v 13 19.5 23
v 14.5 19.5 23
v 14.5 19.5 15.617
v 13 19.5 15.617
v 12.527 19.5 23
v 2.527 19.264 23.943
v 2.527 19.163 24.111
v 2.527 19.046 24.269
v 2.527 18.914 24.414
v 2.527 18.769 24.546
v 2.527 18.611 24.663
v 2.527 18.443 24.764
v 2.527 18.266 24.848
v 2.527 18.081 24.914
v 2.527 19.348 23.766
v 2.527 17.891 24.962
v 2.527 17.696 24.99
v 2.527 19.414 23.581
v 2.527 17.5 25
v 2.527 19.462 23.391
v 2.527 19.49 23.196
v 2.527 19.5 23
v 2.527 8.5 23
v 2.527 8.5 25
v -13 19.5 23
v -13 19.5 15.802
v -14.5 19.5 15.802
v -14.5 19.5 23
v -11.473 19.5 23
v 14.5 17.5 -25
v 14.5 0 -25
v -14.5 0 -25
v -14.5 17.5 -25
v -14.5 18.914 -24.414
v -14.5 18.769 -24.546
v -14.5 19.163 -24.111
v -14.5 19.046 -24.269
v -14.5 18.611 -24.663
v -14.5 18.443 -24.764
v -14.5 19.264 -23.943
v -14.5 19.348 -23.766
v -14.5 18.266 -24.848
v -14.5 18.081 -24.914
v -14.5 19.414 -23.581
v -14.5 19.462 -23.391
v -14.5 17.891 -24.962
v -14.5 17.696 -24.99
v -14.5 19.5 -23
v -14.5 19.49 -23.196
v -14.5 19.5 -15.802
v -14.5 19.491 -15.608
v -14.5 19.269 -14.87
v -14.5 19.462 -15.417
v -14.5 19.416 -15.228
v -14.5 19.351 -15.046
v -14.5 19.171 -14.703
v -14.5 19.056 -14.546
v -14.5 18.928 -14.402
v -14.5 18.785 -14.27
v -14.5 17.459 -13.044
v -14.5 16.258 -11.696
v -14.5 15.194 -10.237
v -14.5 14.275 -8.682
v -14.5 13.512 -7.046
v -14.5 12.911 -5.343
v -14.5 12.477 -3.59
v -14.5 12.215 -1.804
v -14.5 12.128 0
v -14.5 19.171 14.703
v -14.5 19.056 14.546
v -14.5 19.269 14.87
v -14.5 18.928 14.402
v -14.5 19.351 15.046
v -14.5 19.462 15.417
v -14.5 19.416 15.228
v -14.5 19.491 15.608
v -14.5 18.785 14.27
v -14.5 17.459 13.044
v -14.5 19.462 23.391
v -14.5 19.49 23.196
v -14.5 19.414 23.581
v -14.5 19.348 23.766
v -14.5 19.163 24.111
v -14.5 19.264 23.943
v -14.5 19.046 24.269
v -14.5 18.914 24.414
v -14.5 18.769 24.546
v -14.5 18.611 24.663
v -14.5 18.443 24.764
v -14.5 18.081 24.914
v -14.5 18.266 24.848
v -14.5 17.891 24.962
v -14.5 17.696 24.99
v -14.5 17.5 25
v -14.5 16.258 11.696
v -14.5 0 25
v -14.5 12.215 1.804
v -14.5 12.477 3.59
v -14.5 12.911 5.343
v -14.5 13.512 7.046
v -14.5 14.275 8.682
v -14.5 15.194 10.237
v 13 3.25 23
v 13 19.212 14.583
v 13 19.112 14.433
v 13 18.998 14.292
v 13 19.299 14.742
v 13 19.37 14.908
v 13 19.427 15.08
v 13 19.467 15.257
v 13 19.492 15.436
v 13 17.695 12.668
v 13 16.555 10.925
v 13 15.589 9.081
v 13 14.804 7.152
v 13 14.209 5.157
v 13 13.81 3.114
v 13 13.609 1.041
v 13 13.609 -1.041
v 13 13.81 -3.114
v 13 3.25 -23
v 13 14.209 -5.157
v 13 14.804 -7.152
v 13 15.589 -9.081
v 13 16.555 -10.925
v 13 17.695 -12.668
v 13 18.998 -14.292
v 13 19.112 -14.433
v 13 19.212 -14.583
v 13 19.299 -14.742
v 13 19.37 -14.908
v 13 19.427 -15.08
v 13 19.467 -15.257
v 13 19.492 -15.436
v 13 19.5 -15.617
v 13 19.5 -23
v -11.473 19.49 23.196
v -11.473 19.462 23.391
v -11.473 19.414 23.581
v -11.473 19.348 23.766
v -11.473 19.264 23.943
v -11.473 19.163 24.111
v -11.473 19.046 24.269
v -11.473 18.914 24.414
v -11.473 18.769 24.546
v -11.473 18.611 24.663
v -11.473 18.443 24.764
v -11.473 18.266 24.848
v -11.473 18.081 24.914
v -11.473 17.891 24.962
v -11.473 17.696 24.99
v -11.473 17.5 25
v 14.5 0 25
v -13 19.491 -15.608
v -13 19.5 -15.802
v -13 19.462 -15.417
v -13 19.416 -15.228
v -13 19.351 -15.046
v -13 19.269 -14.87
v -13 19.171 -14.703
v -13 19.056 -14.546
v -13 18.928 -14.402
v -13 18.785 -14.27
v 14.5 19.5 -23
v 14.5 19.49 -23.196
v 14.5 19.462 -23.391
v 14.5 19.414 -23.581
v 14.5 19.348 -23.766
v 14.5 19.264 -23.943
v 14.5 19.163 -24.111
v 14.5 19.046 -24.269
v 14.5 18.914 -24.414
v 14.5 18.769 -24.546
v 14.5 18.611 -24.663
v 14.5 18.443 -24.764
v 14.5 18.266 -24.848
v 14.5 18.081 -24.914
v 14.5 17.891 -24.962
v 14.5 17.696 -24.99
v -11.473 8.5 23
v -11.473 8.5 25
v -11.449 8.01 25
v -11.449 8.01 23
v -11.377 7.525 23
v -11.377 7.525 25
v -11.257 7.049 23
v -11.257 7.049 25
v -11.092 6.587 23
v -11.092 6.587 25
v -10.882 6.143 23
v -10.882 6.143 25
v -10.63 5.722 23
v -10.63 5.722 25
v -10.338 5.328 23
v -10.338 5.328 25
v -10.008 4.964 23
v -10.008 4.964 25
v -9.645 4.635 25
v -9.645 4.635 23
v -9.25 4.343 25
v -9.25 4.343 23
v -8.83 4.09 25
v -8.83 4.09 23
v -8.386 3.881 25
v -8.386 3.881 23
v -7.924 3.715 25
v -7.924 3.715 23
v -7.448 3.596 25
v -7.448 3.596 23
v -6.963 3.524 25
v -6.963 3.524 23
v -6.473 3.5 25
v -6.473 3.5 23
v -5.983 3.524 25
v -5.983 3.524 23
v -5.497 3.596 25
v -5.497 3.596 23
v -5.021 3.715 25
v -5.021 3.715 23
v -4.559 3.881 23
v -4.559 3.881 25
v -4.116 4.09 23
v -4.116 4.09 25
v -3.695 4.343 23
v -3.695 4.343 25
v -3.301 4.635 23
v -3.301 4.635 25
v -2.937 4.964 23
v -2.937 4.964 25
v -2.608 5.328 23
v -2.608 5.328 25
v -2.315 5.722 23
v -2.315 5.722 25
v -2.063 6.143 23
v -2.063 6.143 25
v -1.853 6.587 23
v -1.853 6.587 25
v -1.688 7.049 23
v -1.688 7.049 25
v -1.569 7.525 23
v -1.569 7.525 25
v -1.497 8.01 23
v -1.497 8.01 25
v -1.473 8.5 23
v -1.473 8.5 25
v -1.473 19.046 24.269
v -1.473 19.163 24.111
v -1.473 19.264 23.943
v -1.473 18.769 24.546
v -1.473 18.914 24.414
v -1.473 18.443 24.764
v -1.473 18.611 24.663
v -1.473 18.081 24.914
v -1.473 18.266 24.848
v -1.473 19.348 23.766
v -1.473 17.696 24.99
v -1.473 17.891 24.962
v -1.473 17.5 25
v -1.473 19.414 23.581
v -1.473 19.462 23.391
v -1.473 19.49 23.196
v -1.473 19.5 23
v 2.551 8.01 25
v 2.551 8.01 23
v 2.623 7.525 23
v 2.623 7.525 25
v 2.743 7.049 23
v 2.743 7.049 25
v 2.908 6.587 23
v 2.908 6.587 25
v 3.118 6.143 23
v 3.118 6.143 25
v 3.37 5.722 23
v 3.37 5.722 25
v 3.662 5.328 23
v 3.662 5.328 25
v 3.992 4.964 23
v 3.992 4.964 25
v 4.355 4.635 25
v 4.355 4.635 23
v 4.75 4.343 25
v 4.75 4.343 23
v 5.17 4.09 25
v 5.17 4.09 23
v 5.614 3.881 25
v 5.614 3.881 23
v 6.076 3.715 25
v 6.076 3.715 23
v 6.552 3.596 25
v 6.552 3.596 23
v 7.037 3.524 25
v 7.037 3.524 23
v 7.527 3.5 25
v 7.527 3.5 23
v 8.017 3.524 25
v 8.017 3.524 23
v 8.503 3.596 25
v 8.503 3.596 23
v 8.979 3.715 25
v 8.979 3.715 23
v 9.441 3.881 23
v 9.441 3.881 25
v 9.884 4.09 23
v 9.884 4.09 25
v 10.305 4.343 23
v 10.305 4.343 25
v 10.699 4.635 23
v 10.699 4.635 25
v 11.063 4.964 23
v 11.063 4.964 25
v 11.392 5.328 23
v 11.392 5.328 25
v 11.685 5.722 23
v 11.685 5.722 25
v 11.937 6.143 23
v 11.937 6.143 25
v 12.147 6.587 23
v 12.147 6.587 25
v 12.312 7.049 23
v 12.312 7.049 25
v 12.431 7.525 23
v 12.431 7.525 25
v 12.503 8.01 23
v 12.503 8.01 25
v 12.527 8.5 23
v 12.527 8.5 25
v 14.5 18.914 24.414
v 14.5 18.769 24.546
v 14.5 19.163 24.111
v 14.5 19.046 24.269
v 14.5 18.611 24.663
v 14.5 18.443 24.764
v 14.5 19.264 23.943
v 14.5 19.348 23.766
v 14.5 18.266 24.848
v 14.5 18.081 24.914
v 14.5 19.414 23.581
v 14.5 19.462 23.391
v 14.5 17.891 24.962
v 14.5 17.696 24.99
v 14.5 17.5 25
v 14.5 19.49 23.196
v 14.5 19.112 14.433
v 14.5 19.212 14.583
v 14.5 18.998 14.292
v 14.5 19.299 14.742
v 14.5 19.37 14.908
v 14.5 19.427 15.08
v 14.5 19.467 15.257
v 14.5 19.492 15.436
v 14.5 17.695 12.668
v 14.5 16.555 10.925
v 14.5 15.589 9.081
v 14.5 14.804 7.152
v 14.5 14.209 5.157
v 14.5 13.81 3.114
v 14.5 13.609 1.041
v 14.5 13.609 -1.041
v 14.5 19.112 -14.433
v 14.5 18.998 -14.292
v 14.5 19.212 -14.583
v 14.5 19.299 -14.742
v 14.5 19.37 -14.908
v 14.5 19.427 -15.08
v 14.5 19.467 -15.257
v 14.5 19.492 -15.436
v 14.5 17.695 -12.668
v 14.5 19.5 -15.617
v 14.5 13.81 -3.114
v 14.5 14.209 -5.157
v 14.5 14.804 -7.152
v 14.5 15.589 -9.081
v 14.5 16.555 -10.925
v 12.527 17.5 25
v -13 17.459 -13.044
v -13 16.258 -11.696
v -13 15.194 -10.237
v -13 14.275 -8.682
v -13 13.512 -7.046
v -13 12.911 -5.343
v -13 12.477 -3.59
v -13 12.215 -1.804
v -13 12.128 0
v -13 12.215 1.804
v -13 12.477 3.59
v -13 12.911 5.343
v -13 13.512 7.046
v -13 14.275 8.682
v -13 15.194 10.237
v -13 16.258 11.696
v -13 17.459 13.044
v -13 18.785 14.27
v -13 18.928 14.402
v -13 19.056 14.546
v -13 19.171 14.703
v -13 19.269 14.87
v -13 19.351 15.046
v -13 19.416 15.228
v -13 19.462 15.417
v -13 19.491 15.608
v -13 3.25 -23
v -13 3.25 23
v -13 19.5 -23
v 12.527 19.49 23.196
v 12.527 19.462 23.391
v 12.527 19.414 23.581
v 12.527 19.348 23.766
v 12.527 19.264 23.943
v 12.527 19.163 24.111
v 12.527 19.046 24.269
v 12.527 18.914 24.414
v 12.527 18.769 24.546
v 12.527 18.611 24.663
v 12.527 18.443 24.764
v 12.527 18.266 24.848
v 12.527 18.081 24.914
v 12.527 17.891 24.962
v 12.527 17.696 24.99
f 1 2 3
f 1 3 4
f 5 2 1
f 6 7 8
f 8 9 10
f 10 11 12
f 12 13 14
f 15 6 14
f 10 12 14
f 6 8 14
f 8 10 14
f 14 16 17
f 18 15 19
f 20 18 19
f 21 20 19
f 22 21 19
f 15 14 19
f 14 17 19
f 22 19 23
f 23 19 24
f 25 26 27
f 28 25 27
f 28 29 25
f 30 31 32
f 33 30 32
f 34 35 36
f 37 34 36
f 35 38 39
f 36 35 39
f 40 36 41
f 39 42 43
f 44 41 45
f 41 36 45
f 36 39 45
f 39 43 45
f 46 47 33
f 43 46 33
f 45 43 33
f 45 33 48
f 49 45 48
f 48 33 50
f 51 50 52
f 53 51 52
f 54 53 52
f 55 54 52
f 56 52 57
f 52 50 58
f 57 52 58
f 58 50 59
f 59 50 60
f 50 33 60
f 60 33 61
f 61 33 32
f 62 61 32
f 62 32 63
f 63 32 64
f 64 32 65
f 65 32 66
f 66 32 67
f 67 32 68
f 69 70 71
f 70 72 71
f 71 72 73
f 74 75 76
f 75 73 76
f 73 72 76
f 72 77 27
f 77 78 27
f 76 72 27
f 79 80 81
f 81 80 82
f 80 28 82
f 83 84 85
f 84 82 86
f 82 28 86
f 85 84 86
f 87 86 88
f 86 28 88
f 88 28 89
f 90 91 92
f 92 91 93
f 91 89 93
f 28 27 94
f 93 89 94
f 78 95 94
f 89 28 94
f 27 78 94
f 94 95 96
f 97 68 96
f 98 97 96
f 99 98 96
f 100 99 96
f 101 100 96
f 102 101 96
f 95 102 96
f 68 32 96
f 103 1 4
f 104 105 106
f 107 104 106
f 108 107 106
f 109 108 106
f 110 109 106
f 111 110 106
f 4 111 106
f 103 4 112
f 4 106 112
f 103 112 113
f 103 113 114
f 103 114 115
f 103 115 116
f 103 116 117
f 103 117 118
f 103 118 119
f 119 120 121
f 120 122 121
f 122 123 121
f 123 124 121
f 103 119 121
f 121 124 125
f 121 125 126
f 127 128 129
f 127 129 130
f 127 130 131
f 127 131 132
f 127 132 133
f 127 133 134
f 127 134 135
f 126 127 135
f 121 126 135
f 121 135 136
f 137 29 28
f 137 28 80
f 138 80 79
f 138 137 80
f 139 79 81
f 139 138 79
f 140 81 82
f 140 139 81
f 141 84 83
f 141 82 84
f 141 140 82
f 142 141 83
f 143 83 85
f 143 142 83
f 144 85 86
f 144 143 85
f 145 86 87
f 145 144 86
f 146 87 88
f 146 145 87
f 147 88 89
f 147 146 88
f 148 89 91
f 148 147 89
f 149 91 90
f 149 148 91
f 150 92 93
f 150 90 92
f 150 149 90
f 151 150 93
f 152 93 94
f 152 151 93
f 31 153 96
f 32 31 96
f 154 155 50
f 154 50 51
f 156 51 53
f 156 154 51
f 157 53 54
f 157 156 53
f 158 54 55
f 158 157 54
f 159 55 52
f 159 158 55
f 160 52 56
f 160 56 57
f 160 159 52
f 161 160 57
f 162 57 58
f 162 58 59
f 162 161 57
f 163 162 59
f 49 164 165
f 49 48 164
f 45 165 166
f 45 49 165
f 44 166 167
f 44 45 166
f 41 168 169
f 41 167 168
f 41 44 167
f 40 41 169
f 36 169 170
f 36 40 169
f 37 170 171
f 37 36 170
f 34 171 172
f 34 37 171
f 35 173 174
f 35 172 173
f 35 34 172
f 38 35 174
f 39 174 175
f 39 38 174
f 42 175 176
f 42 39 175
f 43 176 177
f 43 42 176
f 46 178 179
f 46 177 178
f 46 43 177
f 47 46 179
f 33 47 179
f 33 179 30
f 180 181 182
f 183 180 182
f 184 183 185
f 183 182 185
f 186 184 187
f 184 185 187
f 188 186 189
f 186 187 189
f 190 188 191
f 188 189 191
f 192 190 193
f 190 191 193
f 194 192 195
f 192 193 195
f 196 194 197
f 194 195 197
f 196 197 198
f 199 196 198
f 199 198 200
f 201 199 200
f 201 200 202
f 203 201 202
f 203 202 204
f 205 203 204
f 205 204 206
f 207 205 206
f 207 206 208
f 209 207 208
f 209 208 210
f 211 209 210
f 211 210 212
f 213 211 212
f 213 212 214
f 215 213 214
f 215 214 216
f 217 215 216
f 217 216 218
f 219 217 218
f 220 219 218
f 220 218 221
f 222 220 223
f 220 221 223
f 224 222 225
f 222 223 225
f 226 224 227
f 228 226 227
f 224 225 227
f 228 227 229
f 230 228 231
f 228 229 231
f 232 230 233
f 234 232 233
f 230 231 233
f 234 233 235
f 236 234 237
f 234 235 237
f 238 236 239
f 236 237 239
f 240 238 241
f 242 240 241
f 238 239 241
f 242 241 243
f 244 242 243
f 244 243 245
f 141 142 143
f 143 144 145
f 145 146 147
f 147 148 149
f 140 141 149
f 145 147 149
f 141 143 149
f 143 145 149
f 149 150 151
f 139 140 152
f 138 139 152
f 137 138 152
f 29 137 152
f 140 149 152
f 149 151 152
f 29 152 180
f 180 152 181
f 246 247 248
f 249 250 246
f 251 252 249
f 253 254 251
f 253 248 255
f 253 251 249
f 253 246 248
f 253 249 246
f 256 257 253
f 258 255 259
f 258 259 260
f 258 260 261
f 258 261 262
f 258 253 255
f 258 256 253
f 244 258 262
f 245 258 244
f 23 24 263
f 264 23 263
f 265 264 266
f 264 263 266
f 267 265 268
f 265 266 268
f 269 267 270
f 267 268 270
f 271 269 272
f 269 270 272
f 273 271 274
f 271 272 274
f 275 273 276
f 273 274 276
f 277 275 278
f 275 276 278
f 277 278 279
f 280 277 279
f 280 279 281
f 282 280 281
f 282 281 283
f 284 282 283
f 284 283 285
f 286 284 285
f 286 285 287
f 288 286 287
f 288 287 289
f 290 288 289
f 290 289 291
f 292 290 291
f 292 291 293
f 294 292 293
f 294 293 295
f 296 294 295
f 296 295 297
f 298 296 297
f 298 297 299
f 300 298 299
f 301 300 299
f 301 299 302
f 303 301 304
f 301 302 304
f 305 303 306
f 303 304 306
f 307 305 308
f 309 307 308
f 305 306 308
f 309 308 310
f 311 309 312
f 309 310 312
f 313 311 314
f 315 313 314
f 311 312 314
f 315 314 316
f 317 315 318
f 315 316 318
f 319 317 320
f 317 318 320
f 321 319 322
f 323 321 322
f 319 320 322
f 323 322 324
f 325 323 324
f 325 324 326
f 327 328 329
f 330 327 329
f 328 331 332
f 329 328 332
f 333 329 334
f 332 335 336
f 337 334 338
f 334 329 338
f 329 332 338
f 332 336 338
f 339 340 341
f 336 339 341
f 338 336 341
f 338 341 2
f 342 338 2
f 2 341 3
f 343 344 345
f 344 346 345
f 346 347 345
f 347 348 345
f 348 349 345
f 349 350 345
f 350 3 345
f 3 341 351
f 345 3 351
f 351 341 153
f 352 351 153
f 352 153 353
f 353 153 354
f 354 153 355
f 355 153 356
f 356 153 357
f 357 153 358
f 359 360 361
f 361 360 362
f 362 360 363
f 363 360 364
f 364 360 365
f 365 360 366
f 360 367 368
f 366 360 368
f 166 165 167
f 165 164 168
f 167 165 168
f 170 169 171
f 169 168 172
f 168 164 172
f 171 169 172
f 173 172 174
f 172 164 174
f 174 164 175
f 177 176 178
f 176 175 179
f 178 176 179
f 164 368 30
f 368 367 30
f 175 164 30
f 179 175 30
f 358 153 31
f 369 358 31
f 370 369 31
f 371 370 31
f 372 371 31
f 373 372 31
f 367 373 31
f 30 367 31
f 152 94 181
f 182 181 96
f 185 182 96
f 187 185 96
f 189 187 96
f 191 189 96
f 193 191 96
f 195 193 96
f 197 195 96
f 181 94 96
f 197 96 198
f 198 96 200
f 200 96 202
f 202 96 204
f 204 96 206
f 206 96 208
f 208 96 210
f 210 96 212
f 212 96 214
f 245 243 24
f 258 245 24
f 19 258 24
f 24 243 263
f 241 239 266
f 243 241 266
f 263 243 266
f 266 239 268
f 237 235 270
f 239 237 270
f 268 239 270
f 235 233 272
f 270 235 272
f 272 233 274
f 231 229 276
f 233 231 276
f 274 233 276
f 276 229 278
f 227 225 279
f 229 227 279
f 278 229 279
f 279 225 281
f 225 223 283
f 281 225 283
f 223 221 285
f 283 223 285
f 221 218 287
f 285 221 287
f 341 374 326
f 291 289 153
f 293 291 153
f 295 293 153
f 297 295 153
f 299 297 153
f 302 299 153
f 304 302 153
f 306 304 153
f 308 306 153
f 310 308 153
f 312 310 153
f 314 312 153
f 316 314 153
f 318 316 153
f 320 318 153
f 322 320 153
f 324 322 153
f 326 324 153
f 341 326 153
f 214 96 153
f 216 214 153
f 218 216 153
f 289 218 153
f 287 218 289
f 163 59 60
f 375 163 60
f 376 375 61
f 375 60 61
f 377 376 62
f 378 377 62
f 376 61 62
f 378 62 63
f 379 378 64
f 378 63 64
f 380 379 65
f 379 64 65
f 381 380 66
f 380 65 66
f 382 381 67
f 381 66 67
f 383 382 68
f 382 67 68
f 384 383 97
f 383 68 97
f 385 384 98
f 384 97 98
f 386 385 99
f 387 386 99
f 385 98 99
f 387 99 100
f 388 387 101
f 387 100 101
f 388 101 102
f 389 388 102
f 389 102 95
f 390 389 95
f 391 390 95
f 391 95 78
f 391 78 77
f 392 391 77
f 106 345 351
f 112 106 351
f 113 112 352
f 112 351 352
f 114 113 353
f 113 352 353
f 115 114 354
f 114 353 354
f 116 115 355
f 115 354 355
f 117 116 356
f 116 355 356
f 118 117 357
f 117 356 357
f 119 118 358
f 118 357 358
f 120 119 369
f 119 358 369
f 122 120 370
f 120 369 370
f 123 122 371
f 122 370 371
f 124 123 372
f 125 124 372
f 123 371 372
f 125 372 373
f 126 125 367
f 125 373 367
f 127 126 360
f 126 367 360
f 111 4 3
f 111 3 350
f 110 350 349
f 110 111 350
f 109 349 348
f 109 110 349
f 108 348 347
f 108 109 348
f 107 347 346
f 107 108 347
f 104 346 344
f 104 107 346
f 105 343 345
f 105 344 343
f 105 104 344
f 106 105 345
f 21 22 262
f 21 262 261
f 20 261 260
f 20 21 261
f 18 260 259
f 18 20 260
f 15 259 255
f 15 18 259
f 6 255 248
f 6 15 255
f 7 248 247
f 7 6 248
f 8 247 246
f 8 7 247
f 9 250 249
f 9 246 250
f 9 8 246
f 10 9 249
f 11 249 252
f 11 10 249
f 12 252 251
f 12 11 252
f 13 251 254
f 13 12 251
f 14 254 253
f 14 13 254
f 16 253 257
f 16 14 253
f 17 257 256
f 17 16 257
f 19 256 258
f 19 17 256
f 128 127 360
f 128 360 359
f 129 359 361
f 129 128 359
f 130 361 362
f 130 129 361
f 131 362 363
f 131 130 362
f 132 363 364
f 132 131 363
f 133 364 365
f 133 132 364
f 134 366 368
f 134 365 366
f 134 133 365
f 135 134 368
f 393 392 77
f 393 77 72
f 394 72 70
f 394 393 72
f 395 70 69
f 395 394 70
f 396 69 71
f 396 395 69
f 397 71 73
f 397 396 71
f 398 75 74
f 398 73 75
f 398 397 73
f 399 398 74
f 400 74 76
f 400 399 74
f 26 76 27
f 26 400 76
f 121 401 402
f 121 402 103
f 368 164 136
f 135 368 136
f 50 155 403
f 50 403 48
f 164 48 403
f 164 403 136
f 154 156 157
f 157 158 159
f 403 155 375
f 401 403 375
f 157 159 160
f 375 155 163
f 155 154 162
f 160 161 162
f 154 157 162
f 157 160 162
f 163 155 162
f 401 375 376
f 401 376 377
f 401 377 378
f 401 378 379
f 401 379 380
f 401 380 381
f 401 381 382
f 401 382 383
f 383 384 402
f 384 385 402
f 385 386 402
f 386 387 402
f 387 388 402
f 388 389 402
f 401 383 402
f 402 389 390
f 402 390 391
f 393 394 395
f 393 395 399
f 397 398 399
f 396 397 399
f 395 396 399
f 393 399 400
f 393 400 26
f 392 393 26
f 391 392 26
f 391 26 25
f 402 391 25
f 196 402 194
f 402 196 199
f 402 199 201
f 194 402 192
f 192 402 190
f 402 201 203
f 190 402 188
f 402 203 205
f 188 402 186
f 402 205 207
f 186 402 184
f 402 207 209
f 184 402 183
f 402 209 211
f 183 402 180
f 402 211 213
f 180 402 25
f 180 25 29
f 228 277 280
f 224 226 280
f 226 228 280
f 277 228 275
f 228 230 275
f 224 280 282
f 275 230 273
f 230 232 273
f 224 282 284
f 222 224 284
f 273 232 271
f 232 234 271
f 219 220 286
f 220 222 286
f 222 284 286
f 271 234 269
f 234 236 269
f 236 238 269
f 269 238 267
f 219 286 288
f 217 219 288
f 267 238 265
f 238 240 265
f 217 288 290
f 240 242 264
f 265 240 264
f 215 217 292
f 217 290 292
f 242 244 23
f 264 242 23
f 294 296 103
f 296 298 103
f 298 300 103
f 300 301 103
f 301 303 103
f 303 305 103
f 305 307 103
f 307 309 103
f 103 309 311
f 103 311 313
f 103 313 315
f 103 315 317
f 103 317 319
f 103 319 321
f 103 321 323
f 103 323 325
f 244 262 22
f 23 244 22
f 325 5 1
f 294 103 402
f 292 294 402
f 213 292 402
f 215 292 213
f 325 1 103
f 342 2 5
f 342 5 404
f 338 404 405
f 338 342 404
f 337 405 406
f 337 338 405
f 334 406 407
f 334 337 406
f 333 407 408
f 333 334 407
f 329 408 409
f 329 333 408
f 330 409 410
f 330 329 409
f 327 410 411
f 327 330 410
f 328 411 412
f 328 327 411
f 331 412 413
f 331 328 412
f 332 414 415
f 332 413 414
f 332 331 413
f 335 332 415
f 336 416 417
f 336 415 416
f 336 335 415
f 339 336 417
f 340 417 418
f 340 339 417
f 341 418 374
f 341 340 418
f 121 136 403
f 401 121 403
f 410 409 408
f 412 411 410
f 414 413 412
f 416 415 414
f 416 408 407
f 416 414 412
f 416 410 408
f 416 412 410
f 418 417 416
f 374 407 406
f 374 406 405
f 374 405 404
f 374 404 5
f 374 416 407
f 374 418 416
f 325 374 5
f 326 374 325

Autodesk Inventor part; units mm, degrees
ref_plane "YZ Plane" through (0, 0, 0) normal (1, 0, 0) x (0, 1, 0)
ref_plane "XZ Plane" through (0, 0, 0) normal (0, 1, 0) x (-1, 0, 0)
ref_plane "XY Plane" through (0, 0, 0) normal (0, 0, 1) x (1, 0, 0)
sketch "Boceto1" plane through (0, 0, 0) normal (0, 1, 0) x (-1, 0, 0)
  line L0 (-13, -23) -> (13, -23)
  line L1 (13, -23) -> (13, 23)
  line L2 (13, 23) -> (-13, 23)
  line L3 (-13, 23) -> (-13, -23)
  line L4 (-13, -23) -> (13, 23) construction
  line L5 (13, -23) -> (-13, 23) construction
  line L6 (-14.5, -25) -> (14.5, -25)
  line L7 (14.5, -25) -> (14.5, 25)
  line L8 (14.5, 25) -> (-14.5, 25)
  line L9 (-14.5, 25) -> (-14.5, -25)
  line L10 (-14.5, -25) -> (14.5, 25) construction
  line L11 (14.5, -25) -> (-14.5, 25) construction
  point P0 (0, 0)
  dimension "d0" = 46
  dimension "d1" = 26
  dimension "d2" = 2
  dimension "d3" = 1.5
extrude "Extrusión1" add sketch "Boceto1" along normal blind 19.5 contours L3 L2 L1 L0 | L9 L8 L7 L6
sketch "Boceto2" plane through (0, 19.5, 0) normal (0, 1, 0) x (1, 0, 0)
  line L0 (-13, -23) -> (13, -23) projected
  line L1 (13, -23) -> (13, 23) projected
  line L2 (13, 23) -> (-13, 23) projected
  line L3 (-13, 23) -> (-13, -23) projected
  point P0 (0, 0)
extrude "Extrusión2" cut sketch "Boceto2" against normal blind 16.25
sketch "Boceto3" plane through (-14.5, 0, 25) normal (0, 0, 1) x (1, 0, 0)
  line L0 (29, 19.5) -> (0, 19.5) projected
  line L1 (13.0274, 19.5) -> (13.0274, 8.5)
  line L2 (17.0274, 19.5) -> (17.0274, 8.5)
  line L3 (3.0274, 19.5) -> (3.0274, 8.5)
  line L4 (27.0274, 19.5) -> (27.0274, 8.5)
  arc A0 (3.0274, 8.5) -> (13.0274, 8.5) centre (8.0274, 8.5) ccw
  arc A1 (17.0274, 8.5) -> (27.0274, 8.5) centre (22.0274, 8.5) ccw
  point P0 (14.5, 0)
  dimension "d8" = 11
  dimension "d10" = 10
  dimension "d11" = 10
  dimension "d12" = 4
  dimension "d13" = 11
  dimension "d14" = 11
  dimension "d15" = 11
extrude "Extrusión3" cut sketch "Boceto3" against normal blind 17
sketch "Boceto4" plane through (-14.5, 0, -25) normal (-1, 0, 0) x (0, 0, 1)
  line L0 (48, 19.5) -> (2, 19.5) projected
  arc A0 (10.16, 19.5) -> (39.84, 19.5) centre (25, 30.7495) ccw
  line L1 (0, 0) -> (0, 19.5) projected
  line L2 (50, 0) -> (50, 19.5) projected
  point P0 (25, 0)
  dimension "d18" = 10.16
  dimension "d19" = 10.16
extrude "Extrusión4" cut sketch "Boceto4" against normal blind 17
sketch "Boceto5" plane through (14.5, 0, 25) normal (1, 0, 0) x (0, 0, -1)
  line L0 (48, 19.5) -> (2, 19.5) projected
  arc A0 (10.16, 19.5) -> (39.84, 19.5) centre (25, 35.1546) ccw
  line L1 (50, 0) -> (50, 19.5) projected
  line L2 (0, 0) -> (0, 19.5) projected
  point P0 (25, 0)
  dimension "d22" = 10.16
  dimension "d23" = 10.16
extrude "Extrusión5" cut sketch "Boceto5" against normal blind 17
fillet "Empalme1" radius 2 8 edges at (13.75, 19.5, -14.84) (13.75, 19.5, 14.84) (13.5137, 19.5, 25) (-13.75, 19.5, -14.84) (-13.75, 19.5, 14.84) (-12.9863, 19.5, 25) (0.5274, 19.5, 25) (0, 19.5, -25)
properties part number "CASE batería"
